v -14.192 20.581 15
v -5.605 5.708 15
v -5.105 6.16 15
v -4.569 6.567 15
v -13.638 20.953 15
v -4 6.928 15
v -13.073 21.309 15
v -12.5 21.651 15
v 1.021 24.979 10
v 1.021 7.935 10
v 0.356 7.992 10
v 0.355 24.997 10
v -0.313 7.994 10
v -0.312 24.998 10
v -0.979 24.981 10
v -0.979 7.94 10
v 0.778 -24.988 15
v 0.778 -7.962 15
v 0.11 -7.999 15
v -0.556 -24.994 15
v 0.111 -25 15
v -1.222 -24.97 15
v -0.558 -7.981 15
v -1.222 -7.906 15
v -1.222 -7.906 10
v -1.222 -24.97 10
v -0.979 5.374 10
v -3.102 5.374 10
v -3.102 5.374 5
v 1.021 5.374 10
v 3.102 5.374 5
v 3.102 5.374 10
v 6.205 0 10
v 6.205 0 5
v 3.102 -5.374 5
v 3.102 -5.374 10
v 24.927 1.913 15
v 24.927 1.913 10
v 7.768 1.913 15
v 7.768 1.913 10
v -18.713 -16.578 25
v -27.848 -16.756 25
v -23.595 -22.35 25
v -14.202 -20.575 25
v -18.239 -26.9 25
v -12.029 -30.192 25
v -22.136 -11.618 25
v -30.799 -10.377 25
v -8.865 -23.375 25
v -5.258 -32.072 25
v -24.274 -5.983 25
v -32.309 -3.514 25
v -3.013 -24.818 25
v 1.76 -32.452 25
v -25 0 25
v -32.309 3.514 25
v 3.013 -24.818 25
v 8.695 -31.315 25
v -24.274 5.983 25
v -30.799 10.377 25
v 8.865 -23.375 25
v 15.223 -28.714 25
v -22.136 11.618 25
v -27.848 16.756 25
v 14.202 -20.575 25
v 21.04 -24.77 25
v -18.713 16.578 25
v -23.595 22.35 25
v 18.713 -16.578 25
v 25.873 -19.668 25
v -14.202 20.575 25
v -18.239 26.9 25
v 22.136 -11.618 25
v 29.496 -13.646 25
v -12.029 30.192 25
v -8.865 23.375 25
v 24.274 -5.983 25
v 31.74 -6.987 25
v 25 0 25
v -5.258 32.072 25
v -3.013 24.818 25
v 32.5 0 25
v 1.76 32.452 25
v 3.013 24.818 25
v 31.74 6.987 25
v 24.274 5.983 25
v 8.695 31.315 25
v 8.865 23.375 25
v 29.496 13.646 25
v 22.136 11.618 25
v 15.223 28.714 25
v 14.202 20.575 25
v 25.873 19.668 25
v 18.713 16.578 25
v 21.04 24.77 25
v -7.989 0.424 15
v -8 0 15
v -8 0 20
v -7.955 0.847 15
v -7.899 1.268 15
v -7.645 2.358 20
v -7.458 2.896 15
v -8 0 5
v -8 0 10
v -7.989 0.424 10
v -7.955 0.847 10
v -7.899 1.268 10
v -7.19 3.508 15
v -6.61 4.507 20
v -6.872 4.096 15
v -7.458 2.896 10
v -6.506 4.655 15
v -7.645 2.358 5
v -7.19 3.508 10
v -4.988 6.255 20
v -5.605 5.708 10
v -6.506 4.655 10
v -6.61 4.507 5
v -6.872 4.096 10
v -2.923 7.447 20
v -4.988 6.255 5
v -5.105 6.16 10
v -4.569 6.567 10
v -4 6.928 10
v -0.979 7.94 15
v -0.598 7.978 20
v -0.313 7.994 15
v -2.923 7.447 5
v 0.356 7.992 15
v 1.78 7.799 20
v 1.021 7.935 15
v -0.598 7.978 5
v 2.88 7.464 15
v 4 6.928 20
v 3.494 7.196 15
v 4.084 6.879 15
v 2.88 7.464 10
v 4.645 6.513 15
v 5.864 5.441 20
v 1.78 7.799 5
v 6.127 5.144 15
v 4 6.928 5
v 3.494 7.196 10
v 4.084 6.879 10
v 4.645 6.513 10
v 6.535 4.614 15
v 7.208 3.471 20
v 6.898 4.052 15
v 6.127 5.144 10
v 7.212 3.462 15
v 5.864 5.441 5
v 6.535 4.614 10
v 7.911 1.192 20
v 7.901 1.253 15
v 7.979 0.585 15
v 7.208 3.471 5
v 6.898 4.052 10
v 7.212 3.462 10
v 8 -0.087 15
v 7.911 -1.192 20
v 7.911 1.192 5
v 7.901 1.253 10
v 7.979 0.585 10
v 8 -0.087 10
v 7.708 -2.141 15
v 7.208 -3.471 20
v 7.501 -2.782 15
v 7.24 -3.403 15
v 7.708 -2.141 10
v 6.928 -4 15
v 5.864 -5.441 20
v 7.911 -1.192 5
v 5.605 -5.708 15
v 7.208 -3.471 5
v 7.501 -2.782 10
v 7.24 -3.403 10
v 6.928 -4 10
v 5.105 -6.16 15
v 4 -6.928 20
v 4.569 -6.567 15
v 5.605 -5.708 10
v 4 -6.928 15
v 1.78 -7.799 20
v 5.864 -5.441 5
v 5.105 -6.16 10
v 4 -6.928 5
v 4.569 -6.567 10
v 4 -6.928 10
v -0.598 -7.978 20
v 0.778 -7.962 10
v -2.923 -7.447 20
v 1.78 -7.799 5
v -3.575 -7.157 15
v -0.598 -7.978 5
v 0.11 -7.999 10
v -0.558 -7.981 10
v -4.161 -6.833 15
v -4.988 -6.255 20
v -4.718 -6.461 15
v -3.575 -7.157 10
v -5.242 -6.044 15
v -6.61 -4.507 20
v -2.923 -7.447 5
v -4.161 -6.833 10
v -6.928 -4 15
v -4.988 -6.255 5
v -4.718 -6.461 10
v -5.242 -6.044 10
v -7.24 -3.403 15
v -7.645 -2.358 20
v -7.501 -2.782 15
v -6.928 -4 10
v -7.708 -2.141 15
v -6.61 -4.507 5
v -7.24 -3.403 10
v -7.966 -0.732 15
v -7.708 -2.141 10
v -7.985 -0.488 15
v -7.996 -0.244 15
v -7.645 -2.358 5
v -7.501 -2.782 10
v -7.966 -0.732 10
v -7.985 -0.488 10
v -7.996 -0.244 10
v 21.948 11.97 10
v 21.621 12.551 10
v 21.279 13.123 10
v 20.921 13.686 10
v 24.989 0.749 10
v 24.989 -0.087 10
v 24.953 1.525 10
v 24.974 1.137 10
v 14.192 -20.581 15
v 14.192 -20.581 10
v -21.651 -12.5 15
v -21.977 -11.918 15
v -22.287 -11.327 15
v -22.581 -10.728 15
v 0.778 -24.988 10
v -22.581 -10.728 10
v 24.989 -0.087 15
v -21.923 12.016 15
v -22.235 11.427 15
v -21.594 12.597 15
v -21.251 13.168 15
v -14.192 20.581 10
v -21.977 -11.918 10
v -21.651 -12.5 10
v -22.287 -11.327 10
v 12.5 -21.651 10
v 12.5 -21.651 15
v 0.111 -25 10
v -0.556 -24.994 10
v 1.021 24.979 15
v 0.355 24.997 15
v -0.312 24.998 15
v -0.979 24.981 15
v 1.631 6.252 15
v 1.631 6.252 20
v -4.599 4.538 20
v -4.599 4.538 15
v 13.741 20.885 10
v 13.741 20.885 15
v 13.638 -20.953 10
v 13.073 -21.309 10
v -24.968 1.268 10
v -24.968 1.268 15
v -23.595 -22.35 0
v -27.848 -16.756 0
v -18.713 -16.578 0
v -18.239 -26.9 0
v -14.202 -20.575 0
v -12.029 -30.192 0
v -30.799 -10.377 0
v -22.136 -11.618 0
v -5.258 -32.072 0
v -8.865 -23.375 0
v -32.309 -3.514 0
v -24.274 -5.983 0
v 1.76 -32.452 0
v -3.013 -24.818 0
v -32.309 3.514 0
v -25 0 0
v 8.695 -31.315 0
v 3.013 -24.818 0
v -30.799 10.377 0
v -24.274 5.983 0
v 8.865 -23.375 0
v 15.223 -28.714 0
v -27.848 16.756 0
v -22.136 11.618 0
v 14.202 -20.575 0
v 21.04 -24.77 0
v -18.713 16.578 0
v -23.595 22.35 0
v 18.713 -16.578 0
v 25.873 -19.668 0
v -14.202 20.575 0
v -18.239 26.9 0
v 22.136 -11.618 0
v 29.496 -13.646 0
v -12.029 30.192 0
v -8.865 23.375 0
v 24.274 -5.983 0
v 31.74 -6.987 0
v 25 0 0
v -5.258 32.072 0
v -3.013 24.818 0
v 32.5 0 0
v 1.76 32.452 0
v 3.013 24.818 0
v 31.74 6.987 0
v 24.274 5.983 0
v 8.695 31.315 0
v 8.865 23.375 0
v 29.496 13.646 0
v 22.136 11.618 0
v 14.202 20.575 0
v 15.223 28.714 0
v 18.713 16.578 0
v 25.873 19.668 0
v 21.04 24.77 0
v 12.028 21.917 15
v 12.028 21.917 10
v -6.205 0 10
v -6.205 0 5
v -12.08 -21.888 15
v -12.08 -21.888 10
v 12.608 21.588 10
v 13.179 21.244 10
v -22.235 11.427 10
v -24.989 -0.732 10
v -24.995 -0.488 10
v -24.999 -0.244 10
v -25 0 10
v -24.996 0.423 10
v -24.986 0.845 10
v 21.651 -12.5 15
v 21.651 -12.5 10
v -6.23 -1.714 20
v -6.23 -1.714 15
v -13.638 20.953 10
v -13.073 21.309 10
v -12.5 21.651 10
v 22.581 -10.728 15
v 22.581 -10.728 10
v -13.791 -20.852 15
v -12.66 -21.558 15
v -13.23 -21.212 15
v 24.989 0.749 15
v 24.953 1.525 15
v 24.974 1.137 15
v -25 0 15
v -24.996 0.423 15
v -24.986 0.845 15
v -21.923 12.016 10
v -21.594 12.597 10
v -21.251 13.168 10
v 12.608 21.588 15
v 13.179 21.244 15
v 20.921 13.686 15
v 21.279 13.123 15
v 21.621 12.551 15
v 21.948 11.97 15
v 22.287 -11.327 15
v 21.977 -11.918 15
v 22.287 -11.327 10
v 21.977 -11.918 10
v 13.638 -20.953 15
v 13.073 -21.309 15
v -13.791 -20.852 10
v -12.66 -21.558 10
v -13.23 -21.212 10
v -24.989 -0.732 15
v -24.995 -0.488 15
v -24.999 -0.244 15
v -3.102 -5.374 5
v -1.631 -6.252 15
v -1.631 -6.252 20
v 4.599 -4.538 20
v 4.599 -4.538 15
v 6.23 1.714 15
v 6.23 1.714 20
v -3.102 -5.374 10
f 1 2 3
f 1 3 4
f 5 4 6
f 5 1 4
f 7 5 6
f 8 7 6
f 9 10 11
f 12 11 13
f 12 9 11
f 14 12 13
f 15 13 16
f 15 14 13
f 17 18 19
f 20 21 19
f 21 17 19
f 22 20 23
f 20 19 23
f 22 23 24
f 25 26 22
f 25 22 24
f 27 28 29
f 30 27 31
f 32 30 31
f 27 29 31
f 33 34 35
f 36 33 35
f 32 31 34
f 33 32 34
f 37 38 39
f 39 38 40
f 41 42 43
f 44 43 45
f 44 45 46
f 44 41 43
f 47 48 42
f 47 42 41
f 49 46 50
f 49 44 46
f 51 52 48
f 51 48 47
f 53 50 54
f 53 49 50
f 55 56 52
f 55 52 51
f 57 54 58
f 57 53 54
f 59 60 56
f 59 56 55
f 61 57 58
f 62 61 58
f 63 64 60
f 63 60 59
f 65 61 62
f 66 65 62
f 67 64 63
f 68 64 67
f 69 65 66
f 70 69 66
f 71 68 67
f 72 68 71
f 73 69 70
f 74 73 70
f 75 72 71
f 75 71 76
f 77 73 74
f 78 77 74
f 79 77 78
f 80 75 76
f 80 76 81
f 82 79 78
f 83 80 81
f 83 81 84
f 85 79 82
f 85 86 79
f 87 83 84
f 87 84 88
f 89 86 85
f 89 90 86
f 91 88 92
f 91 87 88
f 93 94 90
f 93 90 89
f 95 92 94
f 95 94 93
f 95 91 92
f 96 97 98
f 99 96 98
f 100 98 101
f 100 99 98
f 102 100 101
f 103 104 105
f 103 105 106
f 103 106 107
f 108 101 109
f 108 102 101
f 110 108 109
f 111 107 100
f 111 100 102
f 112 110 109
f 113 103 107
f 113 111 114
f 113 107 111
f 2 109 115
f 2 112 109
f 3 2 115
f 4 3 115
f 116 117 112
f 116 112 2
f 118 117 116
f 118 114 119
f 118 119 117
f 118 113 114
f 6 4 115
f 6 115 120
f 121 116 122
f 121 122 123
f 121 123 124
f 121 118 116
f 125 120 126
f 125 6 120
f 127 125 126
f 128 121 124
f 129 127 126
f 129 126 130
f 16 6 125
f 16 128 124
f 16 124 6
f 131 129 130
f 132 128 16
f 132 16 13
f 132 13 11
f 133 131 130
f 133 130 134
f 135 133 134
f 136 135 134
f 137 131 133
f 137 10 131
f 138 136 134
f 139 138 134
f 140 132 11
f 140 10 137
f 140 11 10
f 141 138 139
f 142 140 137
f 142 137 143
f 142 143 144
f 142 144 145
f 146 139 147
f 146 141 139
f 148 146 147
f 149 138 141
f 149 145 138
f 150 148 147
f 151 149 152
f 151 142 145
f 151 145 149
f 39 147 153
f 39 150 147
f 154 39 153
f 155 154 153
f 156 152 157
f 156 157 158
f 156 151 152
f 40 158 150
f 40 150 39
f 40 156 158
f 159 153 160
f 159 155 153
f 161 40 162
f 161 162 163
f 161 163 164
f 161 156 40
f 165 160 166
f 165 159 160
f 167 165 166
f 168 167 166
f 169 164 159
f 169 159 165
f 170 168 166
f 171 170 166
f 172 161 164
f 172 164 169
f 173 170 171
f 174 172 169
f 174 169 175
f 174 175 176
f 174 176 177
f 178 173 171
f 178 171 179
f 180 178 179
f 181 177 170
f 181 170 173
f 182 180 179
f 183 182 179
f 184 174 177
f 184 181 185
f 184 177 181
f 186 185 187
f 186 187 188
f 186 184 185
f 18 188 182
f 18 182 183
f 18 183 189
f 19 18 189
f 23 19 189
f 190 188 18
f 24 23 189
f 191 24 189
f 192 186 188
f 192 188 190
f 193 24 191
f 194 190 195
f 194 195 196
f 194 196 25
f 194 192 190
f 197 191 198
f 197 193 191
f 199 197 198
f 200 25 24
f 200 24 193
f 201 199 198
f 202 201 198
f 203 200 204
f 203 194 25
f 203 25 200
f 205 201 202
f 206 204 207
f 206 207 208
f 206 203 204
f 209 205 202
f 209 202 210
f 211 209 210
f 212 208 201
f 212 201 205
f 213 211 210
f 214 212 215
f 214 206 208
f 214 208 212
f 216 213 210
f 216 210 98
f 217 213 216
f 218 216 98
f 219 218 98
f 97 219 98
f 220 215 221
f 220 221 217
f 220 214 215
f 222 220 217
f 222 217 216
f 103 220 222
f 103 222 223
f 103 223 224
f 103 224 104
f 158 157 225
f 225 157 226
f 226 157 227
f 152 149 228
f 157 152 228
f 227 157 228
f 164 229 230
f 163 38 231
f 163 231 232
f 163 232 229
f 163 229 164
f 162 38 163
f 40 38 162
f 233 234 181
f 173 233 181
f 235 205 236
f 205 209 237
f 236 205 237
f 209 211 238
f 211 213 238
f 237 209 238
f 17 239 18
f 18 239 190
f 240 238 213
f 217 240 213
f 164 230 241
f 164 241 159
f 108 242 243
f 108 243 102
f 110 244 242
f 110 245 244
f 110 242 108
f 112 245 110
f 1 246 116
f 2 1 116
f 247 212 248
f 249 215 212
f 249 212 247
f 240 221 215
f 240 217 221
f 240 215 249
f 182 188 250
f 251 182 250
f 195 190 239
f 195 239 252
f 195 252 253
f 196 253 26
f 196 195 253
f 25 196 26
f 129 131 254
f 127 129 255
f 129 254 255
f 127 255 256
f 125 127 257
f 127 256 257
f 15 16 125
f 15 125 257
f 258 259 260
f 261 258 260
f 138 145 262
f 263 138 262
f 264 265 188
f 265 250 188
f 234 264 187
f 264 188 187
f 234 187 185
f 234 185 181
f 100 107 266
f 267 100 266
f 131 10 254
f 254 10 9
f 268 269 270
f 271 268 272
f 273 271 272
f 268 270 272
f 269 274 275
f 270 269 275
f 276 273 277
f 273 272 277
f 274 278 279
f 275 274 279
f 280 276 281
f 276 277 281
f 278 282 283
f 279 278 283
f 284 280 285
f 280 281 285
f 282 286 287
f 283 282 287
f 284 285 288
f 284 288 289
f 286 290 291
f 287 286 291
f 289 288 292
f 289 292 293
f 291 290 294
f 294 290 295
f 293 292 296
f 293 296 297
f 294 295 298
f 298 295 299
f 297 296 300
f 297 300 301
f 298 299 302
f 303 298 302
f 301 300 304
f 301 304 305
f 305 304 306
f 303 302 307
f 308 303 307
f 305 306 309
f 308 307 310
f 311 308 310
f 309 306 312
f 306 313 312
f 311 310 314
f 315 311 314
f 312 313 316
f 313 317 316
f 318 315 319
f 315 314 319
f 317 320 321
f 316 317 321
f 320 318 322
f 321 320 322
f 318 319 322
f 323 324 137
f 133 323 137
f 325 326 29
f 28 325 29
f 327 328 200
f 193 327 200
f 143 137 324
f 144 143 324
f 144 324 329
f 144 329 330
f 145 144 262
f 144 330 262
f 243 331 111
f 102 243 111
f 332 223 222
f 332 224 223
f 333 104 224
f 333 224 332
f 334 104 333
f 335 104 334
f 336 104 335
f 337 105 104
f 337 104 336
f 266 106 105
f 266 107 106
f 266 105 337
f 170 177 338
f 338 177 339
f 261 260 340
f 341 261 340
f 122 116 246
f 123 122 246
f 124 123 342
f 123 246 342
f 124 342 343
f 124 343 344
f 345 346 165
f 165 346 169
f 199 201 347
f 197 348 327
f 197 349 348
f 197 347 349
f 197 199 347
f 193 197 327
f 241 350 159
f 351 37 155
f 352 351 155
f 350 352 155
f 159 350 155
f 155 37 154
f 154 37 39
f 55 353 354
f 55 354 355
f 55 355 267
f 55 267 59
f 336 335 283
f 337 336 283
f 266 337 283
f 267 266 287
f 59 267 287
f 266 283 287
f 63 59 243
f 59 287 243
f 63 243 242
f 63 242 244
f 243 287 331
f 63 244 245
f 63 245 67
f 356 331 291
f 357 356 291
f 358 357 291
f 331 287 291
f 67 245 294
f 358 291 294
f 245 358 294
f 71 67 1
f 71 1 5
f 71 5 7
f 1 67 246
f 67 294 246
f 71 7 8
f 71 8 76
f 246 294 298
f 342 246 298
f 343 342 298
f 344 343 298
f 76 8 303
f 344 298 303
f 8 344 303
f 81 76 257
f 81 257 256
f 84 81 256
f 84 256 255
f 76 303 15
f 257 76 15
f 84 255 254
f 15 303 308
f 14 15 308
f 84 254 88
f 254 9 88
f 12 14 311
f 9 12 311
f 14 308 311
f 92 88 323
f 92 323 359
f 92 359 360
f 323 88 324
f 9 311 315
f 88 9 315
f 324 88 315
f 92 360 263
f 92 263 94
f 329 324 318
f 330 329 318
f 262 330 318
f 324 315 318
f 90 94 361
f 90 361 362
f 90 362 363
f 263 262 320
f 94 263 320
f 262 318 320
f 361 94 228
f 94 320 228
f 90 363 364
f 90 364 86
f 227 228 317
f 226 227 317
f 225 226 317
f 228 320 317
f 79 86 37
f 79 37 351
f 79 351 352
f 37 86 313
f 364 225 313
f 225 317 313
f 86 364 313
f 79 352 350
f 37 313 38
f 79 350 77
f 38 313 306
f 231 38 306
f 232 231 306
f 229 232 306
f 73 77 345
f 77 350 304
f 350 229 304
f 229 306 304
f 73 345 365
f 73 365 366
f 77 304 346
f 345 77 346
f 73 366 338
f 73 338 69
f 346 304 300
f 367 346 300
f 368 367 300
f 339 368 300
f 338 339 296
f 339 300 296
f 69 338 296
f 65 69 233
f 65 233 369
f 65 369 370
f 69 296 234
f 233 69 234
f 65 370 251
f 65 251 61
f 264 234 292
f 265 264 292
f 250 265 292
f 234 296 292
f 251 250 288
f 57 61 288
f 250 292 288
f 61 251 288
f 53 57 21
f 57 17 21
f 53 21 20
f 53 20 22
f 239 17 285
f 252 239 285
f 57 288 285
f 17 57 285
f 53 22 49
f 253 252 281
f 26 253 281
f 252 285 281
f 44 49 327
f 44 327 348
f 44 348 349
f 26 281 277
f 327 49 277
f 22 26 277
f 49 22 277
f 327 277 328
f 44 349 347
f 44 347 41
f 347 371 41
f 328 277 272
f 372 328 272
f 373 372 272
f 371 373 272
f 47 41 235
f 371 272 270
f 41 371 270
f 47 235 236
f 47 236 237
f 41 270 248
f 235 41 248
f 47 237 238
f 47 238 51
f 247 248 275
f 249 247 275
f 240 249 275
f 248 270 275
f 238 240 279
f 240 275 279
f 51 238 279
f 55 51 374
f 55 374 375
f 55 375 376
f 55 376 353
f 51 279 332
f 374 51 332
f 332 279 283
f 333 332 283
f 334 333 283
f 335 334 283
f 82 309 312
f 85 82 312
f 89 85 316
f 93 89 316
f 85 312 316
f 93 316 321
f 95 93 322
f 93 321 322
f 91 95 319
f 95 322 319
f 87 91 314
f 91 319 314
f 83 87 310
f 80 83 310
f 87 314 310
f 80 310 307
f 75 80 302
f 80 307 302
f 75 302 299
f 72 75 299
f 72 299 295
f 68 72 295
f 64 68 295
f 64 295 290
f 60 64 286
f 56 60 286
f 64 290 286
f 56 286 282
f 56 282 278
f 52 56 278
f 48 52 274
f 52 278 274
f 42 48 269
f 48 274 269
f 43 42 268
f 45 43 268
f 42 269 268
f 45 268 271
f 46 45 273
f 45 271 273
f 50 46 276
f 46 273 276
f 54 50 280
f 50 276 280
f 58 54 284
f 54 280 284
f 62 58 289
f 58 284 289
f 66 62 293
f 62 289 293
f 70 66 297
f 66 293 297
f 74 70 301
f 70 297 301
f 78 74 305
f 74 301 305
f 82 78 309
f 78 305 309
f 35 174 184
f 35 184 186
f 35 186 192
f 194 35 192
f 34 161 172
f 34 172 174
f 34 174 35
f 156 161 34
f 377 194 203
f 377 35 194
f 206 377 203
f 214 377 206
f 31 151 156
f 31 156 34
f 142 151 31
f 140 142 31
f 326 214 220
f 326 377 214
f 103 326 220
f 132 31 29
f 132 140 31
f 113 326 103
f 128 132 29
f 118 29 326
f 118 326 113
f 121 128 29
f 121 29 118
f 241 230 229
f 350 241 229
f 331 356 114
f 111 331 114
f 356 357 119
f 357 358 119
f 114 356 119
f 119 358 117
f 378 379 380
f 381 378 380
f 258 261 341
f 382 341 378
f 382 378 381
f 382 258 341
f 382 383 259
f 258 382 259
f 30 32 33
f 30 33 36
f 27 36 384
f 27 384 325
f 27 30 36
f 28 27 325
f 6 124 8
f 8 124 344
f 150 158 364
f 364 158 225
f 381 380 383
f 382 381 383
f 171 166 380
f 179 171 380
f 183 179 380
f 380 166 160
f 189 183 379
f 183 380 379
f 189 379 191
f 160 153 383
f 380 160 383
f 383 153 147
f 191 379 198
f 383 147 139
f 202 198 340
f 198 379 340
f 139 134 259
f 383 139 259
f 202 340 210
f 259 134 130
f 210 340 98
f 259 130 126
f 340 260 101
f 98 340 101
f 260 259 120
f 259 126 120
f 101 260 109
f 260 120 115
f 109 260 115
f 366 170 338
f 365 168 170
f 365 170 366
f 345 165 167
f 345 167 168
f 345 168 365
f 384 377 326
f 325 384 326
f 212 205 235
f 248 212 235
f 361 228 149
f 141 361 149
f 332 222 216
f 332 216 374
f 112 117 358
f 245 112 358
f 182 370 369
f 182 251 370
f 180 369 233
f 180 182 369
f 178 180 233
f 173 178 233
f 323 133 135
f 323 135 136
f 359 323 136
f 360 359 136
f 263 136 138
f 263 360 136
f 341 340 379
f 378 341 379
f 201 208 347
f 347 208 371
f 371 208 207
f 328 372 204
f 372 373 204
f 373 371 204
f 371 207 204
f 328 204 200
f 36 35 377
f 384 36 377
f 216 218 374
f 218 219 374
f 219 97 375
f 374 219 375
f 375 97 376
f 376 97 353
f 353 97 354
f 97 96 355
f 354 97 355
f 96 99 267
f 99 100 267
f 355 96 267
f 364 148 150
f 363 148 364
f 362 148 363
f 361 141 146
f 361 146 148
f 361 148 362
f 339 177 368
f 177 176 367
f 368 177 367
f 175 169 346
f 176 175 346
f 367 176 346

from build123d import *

# Parameters (mm, degrees)
SKETCH_1_R          = 32.5
EXTRUDE_1_DEPTH     = 25
SKETCH_2_R          = 25
CUT_EXTRUDE_1_DEPTH = 25
SKETCH_6_R          = 8
EXTRUDE_3_DEPTH     = 20
SKETCH_7_R          = 8
CUT_EXTRUDE_2_DEPTH = 5
CUT_EXTRUDE_3_DEPTH = 5
CUT_EXTRUDE_4_DEPTH = 5
SKETCH_11_W         = 21
SKETCH_11_H         = 2
EXTRUDE_1_2_DEPTH   = 5
SKETCH_15_W         = 18
SKETCH_15_H         = 2
EXTRUDE_8_DEPTH     = 5
SKETCH_17_W         = 2
SKETCH_17_H         = 19.626417589
EXTRUDE_9_DEPTH     = 5
SKETCH_19_W         = 2
SKETCH_19_H         = 25
EXTRUDE_10_DEPTH    = 5
EXTRUDE_12_DEPTH    = 5
EXTRUDE_13_DEPTH    = 5
EXTRUDE_16_DEPTH    = 5
EXTRUDE_18_DEPTH    = 5
EXTRUDE_20_DEPTH    = 5
EXTRUDE_21_DEPTH    = 5
EXTRUDE_22_DEPTH    = 5
EXTRUDE_23_DEPTH    = 5


with BuildPart() as part:
    # 草图1 → Extrude 1 (new body)
    with BuildSketch(Plane.XY):
        Circle(SKETCH_1_R)
    extrude(amount=EXTRUDE_1_DEPTH)

    # 草图2 → 切除-拉伸1 (cut)
    with BuildSketch(Plane(origin=(0, 0, 0), x_dir=(-1, 0, 0), z_dir=(0, 0, -1))):
        Circle(SKETCH_2_R)
    extrude(amount=-CUT_EXTRUDE_1_DEPTH, mode=Mode.SUBTRACT)



with BuildPart() as body_2:
    # 草图6 → 凸台-拉伸3 (new body)
    with BuildSketch(Plane(origin=(0, 0, 0), x_dir=(-1, 0, 0), z_dir=(0, 0, -1))):
        Circle(SKETCH_6_R)
    extrude(amount=-EXTRUDE_3_DEPTH)

    # 草图7 → 切除-拉伸2 (cut)
    with BuildSketch(Plane(origin=(0, 0, 0), x_dir=(-1, 0, 0), z_dir=(0, 0, -1))):
        Circle(SKETCH_7_R)
    extrude(amount=-CUT_EXTRUDE_2_DEPTH, mode=Mode.SUBTRACT)

    # 草图8 → 切除-拉伸3 (cut)
    with BuildSketch(Plane(origin=(0, 0, 5), x_dir=(-1, 0, 0), z_dir=(0, 0, -1))):
        Polygon((6.204878503, 0), (3.102439251, 5.373582411), (-3.102439251, 5.373582411), (-6.204878503, 0), (-3.102439251, -5.373582411), (3.102439251, -5.373582411), align=None)
    extrude(amount=-CUT_EXTRUDE_3_DEPTH, mode=Mode.SUBTRACT)

    # 草图9 → 切除-拉伸4 (cut)
    with BuildSketch(Plane.XY.offset(20)):
        Polygon((-1.630765345, -6.252377794), (4.599335331, -4.538473114), (6.230100676, 1.713904681), (1.630765345, 6.252377794), (-4.599335331, 4.538473114), (-6.230100676, -1.713904681), align=None)
    extrude(amount=-CUT_EXTRUDE_4_DEPTH, mode=Mode.SUBTRACT)


with BuildPart() as part_1:
    add(part.part)

    add(body_2.part)  # Extrude 1 2 merges body 2
    # 草图11 → Extrude 1 2 (add)
    with BuildSketch(Plane(origin=(0, -0.732123309, 10), x_dir=(-1, 0, 0), z_dir=(0, 0, -1))):
        with Locations((17.554946424, 1)):
            Rectangle(SKETCH_11_W, SKETCH_11_H)
    extrude(amount=-EXTRUDE_1_2_DEPTH)

    # 草图15 → 拉伸-薄壁8 (add)
    with BuildSketch(Plane(origin=(0.783900643, -0.087404702, 10), x_dir=(-1, 0, 0), z_dir=(0, 0, -1))):
        with Locations((-15.204878503, 1)):
            Rectangle(SKETCH_15_W, SKETCH_15_H)
    extrude(amount=-EXTRUDE_8_DEPTH)

    # 草图17 → 拉伸-薄壁9 (add)
    with BuildSketch(Plane(origin=(1.021360023, 0, 10), x_dir=(-1, 0, 0), z_dir=(0, 0, -1))):
        with Locations((1, 15.186791206)):
            Rectangle(SKETCH_17_W, SKETCH_17_H)
    extrude(amount=-EXTRUDE_9_DEPTH)

    # 草图19 → 拉伸-薄壁10 (add)
    with BuildSketch(Plane(origin=(0, 0, 10), x_dir=(-1, 0, 0), z_dir=(0, 0, -1))):
        with Locations((0.222489214, -12.5)):
            Rectangle(SKETCH_19_W, SKETCH_19_H)
    extrude(amount=-EXTRUDE_10_DEPTH)

    # 草图22 → 拉伸-薄壁12 (add)
    with BuildSketch(Plane(origin=(0.523395748, 0, 10), x_dir=(-1, 0, 0), z_dir=(0, 0, -1))):
        Polygon((0, 0), (-13.36975493, 21.124621964), (-11.679785173, 22.194202358), (1.689969757, 1.069580394), align=None)
    extrude(amount=-EXTRUDE_12_DEPTH)

    # 草图23 → 拉伸-薄壁13 (add)
    with BuildSketch(Plane(origin=(0, -0.702264438, 10), x_dir=(-1, 0, 0), z_dir=(0, 0, -1))):
        Polygon((0, 0), (-22.409578035, 12.938175911), (-21.409578035, 14.670226719), (1, 1.732050808), align=None)
    extrude(amount=-EXTRUDE_13_DEPTH)

    # 草图25 → 拉伸-薄壁16 (add)
    with BuildSketch(Plane(origin=(0, 0.899260589, 10), x_dir=(-1, 0, 0), z_dir=(0, 0, -1))):
        Polygon((0, 0), (21.650635095, 12.5), (22.650635095, 10.767949192), (1, -1.732050808), align=None)
    extrude(amount=-EXTRUDE_16_DEPTH)

    # 草图26 → 拉伸-薄壁18 (add)
    with BuildSketch(Plane(origin=(0, 0, 10), x_dir=(-1, 0, 0), z_dir=(0, 0, -1))):
        Polygon((0, 0), (13.491648386, 23.368220483), (15.223699194, 22.368220483), (1.732050808, -1), align=None)
    extrude(amount=-EXTRUDE_18_DEPTH)

    # 草图27 → 拉伸-薄壁20 (add)
    with BuildSketch(Plane(origin=(0, 0, 10), x_dir=(-1, 0, 0), z_dir=(0, 0, -1))):
        Polygon((0, 0), (-23.067411296, -13.317976121), (-24.067411296, -11.585925314), (-1, 1.732050808), align=None)
    extrude(amount=-EXTRUDE_20_DEPTH)

    # 草图28 → 拉伸-薄壁21 (add)
    with BuildSketch(Plane(origin=(0, 0, 10), x_dir=(-1, 0, 0), z_dir=(0, 0, -1))):
        Polygon((0, 0), (-13.731376059, -23.783440992), (-15.463426867, -22.783440992), (-1.732050808, 1), align=None)
    extrude(amount=-EXTRUDE_21_DEPTH)

    # 草图29 → 拉伸-薄壁22 (add)
    with BuildSketch(Plane(origin=(-1.752500167, 0, 10), x_dir=(-1, 0, 0), z_dir=(0, 0, -1))):
        Polygon((0, 0), (13.9695501, -24.195970532), (12.237499292, -25.195970532), (-1.732050808, -1), align=None)
    extrude(amount=-EXTRUDE_22_DEPTH)

    # 草图30 → 拉伸-薄壁23 (add)
    with BuildSketch(Plane.XY.offset(15)):
        Polygon((0, 0), (-22.652441565, -13.078393235), (-23.652441565, -11.346342428), (-1, 1.732050808), align=None)
    extrude(amount=-EXTRUDE_23_DEPTH)


solid = part_1.part
